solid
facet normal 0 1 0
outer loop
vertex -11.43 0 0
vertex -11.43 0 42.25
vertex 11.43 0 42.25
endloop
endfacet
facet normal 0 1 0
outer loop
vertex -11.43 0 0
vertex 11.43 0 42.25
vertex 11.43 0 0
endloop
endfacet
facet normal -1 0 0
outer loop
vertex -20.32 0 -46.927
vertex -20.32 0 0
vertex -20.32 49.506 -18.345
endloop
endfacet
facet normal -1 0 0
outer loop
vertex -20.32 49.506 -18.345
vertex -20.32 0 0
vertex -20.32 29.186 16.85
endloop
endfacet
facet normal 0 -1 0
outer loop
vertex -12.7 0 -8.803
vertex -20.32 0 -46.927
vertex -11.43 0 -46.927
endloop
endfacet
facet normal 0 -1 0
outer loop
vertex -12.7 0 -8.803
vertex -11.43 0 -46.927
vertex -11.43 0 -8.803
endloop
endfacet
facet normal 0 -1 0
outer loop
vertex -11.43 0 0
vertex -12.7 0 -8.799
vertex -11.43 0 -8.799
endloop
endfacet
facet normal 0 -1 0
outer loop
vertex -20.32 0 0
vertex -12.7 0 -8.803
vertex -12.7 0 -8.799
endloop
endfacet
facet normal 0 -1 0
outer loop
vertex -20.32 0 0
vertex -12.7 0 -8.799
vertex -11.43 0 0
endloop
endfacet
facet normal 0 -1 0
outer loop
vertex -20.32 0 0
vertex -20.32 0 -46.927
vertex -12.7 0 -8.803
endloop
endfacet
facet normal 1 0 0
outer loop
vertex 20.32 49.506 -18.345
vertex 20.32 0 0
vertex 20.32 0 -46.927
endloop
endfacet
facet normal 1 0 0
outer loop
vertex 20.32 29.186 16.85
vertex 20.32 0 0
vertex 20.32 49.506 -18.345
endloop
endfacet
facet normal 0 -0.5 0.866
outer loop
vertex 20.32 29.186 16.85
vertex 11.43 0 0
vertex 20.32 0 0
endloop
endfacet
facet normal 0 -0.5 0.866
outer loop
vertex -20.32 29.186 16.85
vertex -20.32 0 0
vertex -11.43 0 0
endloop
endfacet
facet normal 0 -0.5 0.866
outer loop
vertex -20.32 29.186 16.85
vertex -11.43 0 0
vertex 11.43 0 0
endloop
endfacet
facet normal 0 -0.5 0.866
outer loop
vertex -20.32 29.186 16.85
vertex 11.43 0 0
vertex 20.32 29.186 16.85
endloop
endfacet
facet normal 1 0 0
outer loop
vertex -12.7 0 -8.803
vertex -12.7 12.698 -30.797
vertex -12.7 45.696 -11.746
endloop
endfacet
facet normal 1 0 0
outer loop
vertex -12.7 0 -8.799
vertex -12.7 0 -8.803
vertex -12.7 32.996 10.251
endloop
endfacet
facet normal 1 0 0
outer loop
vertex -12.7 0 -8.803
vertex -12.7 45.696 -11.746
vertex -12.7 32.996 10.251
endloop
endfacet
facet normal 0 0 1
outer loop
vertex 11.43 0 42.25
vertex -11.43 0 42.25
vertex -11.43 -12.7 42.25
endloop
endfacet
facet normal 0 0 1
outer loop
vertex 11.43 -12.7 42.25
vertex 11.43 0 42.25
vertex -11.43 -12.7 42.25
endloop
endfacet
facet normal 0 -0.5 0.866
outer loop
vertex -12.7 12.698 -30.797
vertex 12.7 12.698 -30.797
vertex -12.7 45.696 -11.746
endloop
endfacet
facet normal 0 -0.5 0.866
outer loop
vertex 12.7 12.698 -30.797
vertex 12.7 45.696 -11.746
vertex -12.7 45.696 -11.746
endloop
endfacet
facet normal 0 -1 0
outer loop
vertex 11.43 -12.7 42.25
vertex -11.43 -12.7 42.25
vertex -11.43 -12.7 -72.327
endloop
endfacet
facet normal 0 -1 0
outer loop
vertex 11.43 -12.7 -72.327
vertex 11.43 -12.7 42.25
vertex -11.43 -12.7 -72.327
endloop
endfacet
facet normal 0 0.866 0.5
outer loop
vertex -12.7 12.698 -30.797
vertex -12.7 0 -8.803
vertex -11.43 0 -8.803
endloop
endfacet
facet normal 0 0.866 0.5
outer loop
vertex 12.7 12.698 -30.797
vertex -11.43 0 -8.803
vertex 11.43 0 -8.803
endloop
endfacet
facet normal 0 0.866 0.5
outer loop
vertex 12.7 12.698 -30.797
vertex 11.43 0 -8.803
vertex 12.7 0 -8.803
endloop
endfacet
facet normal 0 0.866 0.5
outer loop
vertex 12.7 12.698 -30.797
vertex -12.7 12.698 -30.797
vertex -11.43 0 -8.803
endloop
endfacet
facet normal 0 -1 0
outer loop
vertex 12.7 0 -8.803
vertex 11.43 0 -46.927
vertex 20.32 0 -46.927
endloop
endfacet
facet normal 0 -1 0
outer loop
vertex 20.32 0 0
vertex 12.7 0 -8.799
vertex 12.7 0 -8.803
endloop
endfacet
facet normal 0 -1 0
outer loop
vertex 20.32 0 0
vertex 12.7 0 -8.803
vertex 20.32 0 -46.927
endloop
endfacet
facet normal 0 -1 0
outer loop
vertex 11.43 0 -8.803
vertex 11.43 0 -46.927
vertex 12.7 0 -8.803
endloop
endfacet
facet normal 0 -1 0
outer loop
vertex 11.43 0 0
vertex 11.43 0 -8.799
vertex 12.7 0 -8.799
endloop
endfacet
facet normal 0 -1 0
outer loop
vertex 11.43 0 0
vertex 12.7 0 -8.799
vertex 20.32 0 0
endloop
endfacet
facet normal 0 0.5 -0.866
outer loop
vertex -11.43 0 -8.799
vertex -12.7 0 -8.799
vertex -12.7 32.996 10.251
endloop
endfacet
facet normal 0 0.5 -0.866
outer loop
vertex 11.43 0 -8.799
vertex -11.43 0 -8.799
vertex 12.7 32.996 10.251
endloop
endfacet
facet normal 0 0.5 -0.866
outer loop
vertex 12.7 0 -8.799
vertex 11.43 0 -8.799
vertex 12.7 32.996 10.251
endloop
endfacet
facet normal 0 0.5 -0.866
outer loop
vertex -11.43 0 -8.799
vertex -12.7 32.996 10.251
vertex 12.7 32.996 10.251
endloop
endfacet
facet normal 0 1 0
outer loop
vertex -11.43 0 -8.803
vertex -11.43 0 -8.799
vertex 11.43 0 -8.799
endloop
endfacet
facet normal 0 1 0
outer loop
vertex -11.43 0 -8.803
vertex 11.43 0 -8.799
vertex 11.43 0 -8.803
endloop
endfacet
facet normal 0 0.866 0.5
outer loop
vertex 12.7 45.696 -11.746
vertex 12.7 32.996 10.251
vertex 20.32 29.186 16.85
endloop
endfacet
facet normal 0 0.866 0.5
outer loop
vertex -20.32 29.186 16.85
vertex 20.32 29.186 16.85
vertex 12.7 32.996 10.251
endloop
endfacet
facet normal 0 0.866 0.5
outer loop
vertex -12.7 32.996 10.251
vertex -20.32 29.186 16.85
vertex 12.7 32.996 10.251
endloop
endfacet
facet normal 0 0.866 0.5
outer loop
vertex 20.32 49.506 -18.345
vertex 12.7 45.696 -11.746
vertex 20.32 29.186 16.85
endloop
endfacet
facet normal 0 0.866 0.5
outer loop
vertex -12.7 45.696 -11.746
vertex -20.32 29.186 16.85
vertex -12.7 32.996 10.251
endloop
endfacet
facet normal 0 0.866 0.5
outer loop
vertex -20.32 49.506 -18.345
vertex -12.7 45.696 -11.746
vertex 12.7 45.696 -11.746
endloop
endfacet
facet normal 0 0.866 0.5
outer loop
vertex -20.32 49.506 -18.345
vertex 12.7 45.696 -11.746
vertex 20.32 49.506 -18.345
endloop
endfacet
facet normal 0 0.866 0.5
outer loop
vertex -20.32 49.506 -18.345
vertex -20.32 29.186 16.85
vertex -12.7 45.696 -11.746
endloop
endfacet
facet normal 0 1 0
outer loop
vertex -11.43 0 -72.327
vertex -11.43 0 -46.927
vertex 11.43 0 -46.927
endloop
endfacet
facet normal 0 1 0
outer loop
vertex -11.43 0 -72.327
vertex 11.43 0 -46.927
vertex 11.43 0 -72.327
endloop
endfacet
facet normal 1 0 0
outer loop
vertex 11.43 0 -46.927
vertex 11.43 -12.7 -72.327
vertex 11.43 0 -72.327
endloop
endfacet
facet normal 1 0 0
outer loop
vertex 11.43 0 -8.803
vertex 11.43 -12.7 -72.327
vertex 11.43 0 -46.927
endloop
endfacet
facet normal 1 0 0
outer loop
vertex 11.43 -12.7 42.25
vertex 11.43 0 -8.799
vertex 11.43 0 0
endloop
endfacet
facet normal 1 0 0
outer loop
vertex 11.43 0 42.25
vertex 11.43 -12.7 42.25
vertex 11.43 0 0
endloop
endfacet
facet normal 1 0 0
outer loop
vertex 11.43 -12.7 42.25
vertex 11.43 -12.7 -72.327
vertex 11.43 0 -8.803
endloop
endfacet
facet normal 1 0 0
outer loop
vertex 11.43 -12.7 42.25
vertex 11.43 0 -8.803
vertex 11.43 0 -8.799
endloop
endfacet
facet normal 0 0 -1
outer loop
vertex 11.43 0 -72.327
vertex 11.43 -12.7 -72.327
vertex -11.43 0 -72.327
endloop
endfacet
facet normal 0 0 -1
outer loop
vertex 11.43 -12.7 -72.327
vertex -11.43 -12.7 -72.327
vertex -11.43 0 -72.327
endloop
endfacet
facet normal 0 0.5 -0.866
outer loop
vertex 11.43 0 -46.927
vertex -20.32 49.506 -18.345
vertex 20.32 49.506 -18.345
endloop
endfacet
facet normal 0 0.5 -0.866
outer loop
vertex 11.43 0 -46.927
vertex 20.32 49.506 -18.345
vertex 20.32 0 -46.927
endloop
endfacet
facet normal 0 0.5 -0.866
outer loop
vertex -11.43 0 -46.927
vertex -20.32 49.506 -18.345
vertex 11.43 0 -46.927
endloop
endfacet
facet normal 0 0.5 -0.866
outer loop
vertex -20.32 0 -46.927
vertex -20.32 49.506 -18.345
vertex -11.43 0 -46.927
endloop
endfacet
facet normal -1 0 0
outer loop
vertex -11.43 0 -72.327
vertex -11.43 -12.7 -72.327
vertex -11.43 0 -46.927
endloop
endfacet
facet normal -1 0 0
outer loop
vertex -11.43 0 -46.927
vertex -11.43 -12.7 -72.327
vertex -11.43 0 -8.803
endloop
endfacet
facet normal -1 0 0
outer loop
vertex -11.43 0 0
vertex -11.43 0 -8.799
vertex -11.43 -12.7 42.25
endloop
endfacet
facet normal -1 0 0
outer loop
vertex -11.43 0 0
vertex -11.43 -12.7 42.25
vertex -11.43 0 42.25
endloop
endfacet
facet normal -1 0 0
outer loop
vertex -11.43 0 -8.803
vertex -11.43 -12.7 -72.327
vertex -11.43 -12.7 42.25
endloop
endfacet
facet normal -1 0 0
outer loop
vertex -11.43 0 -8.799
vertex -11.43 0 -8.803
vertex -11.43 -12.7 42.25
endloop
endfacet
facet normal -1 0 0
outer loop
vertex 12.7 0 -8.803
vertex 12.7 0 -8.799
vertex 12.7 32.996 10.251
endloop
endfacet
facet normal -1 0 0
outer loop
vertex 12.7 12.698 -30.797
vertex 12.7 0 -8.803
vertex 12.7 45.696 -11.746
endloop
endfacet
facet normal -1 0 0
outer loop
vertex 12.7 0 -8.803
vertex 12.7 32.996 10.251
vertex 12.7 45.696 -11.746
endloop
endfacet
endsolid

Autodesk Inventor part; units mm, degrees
ref_plane "YZ Plane" through (0, 0, 0) normal (1, 0, 0) x (0, 1, 0)
ref_plane "XZ Plane" through (0, 0, 0) normal (0, 1, 0) x (-1, 0, 0)
ref_plane "XY Plane" through (0, 0, 0) normal (0, 0, 1) x (1, 0, 0)
sketch "Sketch1" plane through (0, 0, 0) normal (1, 0, 0) x (0, 1, 0)
  line L0 (0, 0) -> (29.1856, 16.8503)
  line L1 (29.1856, 16.8503) -> (49.5056, -18.345)
  line L2 (0, -73.2789) -> (0, 37.3579) projected
  line L3 (49.5056, -18.345) -> (0, -46.927)
  line L4 (0, 0) -> (0, -46.927)
  line L5 (32.9956, 10.2512) -> (0, -8.7988) construction
  dimension "d0" = 40.64
  dimension "d1" = 60
  dimension "d5" = 7.62
  dimension "d6" = 38.1
extrude "Extrusion1" add sketch "Sketch1" along normal mid plane 40.64
sketch "Sketch2" plane through (-20.32, 29.1856, 16.8503) normal (0, 0.866, 0.5) x (1, 0, 0)
  line L0 (0, 0) -> (40.64, 0) construction
  line L1 (40.64, 0) -> (40.64, 40.64) construction
  line L2 (0, 0) -> (40.64, 40.64) construction
  line L3 (40.64, 40.64) -> (0, 40.64) construction
  line L4 (0, 40.64) -> (40.64, 0) construction
  line L5 (7.62, 7.62) -> (33.02, 7.62)
  line L6 (33.02, 7.62) -> (33.02, 33.02)
  line L7 (33.02, 33.02) -> (7.62, 33.02)
  line L8 (7.62, 33.02) -> (7.62, 7.62)
  line L9 (7.62, 7.62) -> (33.02, 33.02) construction
  line L10 (33.02, 7.62) -> (7.62, 33.02) construction
  point P0 (20.32, 0)
  point P1 (20.32, 20.32)
  dimension "d7" = 25.4
extrude "Extrusion2" cut sketch "Sketch2" against normal blind 38.1
sketch "Sketch3" plane through (0, 0, 0) normal (1, 0, 0) x (0, 1, 0)
  line L0 (29.1856, 16.8503) -> (0, 0) projected
  line L1 (0, 0) -> (0, -46.927) projected
  line L2 (0, -46.927) -> (49.5056, -18.345) projected
  line L3 (12.7, -30.7959) -> (0, -8.7988) projected
  line L4 (32.9956, 10.2512) -> (0, -8.7988) projected
  line L5 (0, 0) -> (0, -46.927)
  line L6 (29.1856, 16.8503) -> (15.6348, 16.8503) construction
  line L7 (0, 0) -> (29.1856, 16.8503) projected
  line L8 (0, 0) -> (0, 42.2503)
  line L9 (49.5056, -18.345) -> (0, -46.927) projected
  line L10 (0, -46.927) -> (0, -72.327)
  line L11 (0, -108.8389) -> (0, 72.9179) projected
  line L12 (0, 42.2503) -> (-12.7, 42.2503)
  line L13 (-12.7, 42.2503) -> (-12.7, -72.327)
  line L14 (-12.7, -72.327) -> (0, -72.327)
  point P0 (1.0999, -13.335)
  point P1 (0, -8.7988)
  dimension "d10" = 25.4
  dimension "d11" = 25.4
  dimension "d12" = 12.7
extrude "Extrusion3" add sketch "Sketch3" along normal mid plane 22.86
equation "\"d0\" = widthToSupportExtrusion"
equation "\"d1\" = attachementAngle"
equation "\"d6\" = insertDepth"
equation "\"d2\" = widthToSupportExtrusion"
equation "\"d7\" = extrusionSize"
equation "\"d8\" = insertDepth"
equation "\"d12\" = supportBaseDepth"
equation "\"d13\" = supportBaseWidth"
equation "\"attachementAngle\" = 60deg"
equation "\"extrusionSize\" = 25.4"
equation "\"wallThickness\" = 6.35"
equation "\"slipClearance\" = 1.27"
equation "\"insertForExtrusion\" = extrusionSize + 2 * slipClearance"
equation "\"widthToSupportExtrusion\" = insertForExtrusion + 2 * wallThickness"
equation "\"insertDepth\" = 38.1"
equation "\"supportBaseWidth\" = 22.86"
equation "\"supportBaseDepth\" = 12.7"
properties part number "60DegreeAttachementV02"
